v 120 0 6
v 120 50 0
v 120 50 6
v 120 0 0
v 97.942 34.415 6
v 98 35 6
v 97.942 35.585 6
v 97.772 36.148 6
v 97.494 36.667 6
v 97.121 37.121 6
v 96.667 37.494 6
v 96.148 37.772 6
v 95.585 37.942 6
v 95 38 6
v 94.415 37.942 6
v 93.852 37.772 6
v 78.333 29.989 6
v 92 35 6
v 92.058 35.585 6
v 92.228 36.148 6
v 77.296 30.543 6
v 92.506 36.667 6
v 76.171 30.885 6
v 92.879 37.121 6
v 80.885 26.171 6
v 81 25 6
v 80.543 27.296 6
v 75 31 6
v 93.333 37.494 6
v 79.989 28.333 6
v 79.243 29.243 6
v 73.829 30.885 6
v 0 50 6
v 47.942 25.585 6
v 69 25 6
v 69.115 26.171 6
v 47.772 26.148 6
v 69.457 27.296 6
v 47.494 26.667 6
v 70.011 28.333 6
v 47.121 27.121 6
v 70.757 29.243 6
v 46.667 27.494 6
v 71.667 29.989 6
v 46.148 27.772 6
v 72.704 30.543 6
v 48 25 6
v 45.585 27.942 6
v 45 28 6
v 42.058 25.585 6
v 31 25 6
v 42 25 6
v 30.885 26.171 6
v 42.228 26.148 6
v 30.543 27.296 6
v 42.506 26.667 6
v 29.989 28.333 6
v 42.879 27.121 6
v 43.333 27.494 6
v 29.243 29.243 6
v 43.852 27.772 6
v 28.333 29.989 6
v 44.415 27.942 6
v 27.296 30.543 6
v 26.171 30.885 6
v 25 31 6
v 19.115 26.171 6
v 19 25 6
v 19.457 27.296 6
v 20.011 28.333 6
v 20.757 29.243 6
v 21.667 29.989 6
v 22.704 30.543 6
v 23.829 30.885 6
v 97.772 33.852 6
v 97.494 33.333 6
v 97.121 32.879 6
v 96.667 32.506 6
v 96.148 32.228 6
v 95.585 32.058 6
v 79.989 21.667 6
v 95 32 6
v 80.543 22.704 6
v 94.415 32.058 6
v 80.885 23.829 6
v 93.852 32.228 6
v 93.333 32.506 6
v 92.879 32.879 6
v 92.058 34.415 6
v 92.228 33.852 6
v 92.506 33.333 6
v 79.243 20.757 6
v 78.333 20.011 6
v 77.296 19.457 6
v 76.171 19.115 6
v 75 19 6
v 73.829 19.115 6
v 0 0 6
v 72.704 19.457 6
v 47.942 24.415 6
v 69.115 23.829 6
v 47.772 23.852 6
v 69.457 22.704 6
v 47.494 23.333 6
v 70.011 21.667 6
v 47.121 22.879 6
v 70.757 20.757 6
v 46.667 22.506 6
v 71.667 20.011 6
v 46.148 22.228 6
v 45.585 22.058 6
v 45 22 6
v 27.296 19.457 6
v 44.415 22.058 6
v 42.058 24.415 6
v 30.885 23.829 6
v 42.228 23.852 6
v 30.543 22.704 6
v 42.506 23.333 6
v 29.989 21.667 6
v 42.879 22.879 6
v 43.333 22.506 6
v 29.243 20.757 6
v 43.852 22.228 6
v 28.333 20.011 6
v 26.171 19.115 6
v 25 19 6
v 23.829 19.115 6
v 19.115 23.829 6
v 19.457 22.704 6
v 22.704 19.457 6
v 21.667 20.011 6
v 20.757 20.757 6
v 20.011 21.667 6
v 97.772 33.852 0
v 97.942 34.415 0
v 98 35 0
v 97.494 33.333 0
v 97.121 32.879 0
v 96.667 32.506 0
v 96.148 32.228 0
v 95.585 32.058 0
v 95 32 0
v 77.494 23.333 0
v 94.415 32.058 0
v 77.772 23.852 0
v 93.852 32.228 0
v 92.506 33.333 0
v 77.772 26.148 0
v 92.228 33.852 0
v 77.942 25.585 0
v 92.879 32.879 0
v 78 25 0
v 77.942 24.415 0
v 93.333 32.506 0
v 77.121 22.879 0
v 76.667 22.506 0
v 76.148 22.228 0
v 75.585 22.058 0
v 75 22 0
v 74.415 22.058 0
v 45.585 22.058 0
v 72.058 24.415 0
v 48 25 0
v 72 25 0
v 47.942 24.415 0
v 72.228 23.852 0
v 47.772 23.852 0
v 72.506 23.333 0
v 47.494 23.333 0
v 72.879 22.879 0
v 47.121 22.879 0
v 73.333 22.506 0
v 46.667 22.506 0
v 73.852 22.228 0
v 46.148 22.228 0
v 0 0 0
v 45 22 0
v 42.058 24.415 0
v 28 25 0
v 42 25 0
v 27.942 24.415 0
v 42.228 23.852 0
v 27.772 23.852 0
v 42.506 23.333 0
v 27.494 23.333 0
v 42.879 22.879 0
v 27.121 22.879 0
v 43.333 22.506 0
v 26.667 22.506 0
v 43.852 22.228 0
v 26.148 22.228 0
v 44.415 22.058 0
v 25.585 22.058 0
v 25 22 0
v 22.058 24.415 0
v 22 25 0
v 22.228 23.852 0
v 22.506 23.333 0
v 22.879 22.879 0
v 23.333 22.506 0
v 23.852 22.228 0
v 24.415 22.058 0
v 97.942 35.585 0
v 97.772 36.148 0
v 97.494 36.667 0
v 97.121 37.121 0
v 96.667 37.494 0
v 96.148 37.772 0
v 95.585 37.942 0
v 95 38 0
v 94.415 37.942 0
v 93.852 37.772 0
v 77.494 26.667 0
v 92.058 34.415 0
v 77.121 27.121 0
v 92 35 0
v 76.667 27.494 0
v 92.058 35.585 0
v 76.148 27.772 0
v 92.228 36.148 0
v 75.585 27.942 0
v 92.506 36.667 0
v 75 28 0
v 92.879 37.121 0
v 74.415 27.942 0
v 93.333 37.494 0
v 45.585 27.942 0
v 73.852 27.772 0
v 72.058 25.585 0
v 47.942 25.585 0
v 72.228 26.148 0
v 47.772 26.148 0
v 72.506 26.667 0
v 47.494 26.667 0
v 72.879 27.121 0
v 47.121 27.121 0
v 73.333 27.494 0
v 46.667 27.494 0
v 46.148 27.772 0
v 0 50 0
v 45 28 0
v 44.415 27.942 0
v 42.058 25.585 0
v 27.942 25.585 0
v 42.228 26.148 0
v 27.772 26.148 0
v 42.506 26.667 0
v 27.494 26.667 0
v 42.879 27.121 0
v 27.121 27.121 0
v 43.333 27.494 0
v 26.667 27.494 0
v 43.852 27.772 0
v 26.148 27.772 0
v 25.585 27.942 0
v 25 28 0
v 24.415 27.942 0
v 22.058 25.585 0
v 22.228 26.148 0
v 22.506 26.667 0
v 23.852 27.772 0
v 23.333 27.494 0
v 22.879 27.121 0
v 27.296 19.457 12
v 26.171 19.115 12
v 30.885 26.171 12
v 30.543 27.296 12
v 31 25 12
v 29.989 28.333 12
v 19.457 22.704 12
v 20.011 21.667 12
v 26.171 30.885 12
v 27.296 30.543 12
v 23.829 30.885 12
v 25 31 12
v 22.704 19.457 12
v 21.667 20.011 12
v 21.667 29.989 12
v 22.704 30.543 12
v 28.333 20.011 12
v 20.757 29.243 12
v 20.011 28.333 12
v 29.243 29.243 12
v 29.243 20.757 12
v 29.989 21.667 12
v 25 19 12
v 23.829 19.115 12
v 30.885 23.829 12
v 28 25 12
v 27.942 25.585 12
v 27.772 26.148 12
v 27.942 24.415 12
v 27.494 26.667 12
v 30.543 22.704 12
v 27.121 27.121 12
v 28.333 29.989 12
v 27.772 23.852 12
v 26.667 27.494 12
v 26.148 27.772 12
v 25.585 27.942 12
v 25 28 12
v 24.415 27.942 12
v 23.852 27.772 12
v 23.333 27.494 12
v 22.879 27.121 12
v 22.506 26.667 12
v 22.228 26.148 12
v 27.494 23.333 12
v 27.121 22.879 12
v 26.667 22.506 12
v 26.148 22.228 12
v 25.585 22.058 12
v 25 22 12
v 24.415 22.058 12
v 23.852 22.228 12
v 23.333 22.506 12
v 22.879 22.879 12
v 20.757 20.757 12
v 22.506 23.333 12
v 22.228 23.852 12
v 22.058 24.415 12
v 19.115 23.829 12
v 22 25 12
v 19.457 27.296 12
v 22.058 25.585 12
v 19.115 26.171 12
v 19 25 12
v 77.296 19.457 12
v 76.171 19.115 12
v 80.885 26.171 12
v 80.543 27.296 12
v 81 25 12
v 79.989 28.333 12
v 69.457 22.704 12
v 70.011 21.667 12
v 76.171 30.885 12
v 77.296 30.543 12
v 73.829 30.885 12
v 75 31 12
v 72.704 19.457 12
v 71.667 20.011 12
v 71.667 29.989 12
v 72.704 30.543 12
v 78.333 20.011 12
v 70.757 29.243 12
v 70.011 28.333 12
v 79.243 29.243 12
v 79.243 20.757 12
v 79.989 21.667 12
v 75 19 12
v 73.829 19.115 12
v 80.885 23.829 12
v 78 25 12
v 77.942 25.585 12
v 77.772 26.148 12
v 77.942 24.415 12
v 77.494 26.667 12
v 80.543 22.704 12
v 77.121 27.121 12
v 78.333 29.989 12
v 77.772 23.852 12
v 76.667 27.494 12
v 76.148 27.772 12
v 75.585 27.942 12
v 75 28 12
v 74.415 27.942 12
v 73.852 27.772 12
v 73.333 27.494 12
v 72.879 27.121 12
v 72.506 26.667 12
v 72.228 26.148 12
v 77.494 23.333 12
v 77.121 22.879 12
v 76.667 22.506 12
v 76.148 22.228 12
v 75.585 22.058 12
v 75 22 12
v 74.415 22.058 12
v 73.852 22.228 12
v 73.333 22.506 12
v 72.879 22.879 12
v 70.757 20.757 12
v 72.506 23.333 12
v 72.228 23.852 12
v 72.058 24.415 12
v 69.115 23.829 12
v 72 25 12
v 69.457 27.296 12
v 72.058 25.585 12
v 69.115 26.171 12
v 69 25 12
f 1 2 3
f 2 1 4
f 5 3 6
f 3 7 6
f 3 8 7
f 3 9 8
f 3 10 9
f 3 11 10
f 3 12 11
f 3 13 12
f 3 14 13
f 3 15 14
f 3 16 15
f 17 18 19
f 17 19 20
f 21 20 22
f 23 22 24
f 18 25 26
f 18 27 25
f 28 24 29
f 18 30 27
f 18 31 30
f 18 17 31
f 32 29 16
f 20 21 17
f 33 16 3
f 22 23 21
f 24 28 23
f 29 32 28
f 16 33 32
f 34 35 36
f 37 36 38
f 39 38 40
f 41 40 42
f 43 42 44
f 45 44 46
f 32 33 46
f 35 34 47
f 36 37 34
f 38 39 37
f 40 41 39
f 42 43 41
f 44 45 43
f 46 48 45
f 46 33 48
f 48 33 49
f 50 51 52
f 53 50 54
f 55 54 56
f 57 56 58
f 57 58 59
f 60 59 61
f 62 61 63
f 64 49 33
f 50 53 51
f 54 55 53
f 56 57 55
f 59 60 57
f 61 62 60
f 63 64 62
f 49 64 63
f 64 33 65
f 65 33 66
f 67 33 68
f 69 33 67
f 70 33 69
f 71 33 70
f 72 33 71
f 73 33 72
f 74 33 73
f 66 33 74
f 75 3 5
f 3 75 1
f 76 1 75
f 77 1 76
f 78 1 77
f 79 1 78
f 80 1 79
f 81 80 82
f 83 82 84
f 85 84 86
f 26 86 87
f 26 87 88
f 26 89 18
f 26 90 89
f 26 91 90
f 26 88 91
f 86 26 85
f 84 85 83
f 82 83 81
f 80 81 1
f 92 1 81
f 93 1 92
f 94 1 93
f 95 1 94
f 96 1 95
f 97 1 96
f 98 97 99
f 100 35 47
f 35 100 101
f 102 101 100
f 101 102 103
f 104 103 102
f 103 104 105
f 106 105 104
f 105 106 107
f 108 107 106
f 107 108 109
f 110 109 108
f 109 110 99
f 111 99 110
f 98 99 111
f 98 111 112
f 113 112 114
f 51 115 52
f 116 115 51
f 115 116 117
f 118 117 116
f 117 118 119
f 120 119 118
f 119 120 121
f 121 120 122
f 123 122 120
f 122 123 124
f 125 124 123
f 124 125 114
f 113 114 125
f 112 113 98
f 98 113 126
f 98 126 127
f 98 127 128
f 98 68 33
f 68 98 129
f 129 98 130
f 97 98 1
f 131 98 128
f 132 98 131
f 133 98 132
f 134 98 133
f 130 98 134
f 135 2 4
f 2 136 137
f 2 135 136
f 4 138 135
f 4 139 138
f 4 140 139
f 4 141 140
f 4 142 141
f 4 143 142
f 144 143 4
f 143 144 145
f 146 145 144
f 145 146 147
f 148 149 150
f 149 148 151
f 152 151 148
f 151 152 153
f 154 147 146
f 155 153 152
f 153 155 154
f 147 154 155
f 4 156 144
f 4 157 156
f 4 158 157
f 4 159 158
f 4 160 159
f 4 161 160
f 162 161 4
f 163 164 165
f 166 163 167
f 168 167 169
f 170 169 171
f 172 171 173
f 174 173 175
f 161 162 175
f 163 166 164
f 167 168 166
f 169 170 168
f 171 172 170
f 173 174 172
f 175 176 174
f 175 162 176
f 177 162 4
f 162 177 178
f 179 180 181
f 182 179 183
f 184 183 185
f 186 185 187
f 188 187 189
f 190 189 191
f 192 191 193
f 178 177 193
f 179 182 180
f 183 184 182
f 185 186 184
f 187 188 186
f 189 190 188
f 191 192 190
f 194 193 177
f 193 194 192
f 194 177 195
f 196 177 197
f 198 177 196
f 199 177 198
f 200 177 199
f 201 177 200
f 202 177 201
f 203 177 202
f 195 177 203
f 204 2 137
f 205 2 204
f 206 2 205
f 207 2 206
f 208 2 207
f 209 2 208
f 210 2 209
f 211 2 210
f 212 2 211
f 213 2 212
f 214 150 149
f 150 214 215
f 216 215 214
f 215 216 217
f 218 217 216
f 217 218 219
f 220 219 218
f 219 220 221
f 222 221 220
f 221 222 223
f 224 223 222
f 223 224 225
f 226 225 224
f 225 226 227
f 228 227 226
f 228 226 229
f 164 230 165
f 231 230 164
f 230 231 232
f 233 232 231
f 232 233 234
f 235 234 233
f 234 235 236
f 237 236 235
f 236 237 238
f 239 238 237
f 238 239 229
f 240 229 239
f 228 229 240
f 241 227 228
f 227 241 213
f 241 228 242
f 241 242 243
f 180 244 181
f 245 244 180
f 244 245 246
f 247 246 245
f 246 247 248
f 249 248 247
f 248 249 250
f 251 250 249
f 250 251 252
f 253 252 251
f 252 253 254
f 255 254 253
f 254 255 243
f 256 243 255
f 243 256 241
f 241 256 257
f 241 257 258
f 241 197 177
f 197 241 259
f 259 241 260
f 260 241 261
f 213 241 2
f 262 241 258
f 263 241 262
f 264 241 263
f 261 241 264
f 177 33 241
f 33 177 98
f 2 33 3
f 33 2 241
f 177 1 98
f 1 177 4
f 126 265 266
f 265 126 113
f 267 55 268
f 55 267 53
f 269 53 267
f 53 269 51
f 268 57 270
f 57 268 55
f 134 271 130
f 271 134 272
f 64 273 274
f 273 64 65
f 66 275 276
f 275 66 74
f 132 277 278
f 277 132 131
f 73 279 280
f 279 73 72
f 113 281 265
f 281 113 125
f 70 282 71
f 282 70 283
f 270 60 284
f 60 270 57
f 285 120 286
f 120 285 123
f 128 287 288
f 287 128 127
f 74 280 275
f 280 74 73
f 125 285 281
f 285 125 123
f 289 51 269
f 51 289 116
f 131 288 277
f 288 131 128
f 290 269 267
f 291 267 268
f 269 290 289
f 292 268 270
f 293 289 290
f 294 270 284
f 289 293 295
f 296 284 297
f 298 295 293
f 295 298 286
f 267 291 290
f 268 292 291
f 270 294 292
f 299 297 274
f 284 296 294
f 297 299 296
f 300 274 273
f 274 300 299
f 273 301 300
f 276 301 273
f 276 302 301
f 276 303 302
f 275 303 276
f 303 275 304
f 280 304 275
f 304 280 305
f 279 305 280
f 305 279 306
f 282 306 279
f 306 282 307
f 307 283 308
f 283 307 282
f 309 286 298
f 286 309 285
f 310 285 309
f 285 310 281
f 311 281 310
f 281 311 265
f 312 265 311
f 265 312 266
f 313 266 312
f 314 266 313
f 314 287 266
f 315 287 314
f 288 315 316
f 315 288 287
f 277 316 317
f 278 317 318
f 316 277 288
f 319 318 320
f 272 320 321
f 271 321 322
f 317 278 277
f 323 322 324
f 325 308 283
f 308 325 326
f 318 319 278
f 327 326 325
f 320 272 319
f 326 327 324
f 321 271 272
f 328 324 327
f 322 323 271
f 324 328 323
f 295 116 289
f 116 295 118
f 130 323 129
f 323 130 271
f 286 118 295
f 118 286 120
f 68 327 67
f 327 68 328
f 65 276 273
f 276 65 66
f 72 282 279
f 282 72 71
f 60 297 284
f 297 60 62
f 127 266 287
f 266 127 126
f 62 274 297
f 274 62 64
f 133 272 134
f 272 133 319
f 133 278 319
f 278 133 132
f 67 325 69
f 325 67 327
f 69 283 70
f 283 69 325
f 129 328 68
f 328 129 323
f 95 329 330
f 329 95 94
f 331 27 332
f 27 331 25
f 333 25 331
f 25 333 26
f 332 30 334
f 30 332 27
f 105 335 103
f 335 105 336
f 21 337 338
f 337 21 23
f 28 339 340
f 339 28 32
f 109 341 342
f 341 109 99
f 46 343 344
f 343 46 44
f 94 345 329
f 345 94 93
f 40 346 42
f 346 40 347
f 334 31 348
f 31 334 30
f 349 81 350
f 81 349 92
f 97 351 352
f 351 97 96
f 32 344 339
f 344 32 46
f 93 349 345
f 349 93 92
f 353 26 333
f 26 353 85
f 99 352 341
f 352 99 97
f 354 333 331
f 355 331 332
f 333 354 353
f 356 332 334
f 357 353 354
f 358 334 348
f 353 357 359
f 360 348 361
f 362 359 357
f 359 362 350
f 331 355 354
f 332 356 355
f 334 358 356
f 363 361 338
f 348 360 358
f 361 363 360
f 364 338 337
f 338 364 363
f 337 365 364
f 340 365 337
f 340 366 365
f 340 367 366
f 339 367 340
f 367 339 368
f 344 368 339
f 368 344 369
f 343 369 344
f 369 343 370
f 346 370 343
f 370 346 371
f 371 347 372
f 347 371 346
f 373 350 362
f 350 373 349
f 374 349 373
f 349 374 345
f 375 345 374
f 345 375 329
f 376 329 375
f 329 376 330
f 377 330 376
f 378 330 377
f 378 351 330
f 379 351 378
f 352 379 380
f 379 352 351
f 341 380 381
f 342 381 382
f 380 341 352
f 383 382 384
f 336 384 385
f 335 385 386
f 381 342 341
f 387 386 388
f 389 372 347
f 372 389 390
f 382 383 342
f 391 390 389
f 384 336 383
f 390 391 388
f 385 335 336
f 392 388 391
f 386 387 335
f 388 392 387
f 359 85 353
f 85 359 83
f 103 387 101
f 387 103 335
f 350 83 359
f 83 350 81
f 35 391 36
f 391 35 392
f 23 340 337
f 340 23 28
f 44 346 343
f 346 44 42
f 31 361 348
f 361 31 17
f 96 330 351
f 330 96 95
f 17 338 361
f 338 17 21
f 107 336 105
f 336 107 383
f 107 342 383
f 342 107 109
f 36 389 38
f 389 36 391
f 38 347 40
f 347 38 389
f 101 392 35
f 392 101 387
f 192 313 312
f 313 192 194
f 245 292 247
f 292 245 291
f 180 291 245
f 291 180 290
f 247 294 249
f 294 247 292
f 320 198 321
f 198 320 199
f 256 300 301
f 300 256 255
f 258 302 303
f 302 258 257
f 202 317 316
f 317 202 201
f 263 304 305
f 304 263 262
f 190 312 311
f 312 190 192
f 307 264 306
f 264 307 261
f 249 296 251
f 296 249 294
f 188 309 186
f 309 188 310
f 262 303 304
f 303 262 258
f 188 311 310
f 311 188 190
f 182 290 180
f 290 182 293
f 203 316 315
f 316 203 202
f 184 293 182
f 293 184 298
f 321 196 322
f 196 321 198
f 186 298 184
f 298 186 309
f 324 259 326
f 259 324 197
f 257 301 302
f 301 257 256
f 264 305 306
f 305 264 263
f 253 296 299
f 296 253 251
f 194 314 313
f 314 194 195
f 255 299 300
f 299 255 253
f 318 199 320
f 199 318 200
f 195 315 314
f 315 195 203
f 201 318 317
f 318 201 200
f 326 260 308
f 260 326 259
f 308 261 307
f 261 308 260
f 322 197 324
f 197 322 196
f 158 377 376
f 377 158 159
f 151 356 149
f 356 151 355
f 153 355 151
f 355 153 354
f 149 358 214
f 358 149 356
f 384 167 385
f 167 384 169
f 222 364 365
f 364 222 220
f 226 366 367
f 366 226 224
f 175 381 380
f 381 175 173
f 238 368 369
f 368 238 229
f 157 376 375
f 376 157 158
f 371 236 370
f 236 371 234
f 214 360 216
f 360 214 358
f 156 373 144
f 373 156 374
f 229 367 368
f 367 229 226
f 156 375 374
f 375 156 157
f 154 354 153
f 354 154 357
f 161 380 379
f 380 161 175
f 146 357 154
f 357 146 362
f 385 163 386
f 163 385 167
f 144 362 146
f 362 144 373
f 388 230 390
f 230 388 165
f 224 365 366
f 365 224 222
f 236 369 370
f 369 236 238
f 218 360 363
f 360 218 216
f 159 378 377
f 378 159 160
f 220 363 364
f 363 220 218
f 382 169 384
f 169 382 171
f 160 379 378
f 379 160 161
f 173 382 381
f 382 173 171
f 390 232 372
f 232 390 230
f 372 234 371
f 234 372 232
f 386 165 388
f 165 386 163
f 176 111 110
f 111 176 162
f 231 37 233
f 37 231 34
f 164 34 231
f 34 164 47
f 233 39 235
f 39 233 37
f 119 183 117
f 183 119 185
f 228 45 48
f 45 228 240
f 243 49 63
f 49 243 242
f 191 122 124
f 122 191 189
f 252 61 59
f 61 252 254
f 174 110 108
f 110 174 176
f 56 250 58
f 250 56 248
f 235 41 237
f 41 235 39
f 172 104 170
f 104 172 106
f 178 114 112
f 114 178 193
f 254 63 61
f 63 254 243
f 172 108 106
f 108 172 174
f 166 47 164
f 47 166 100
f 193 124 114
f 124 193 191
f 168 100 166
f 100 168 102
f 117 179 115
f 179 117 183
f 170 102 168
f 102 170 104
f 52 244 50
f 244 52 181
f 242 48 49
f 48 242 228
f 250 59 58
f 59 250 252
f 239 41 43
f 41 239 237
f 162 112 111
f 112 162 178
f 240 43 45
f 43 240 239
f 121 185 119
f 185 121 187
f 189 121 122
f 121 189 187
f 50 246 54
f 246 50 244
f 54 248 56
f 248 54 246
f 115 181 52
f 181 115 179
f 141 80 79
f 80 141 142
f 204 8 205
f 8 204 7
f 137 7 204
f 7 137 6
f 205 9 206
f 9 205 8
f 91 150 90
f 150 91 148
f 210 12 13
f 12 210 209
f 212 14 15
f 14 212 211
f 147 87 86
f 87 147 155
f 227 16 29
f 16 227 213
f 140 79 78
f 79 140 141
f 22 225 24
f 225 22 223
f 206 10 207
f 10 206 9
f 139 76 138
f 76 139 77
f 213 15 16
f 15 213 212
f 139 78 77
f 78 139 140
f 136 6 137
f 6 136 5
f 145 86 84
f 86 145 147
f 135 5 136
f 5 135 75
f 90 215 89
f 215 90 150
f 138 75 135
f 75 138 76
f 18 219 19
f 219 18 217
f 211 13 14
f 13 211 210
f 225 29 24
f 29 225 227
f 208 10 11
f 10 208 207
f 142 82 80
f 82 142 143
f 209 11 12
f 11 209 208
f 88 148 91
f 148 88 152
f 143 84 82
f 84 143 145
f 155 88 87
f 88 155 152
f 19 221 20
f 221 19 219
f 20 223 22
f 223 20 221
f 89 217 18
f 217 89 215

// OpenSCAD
$fn = 32;

// ----------------------------------------------------------------------
// Mixed field: bosses and holes at given coordinates
// ----------------------------------------------------------------------

// --- parameters (mm) ---
plate_l = 120;            // plate length, X
plate_w = 50;             // plate width, Y
plate_t = 6;              // plate thickness, Z
boss_d = 12;              // boss diameter
boss_h = 6;               // boss height above the plate
hole_d = 6;               // through hole diameter
fit_tol = 0.02;           // tolerance for press fits, mm
free_tol = 0.2;           // tolerance for clearance fits, mm

total_h = plate_t + boss_h;  // overall height

difference() {
  union() {
    cube([plate_l, plate_w, plate_t]);
    translate([25, 25, plate_t]) cylinder(h = boss_h, d = boss_d);
    translate([75, 25, plate_t]) cylinder(h = boss_h, d = boss_d);
  }
  translate([25, 25, -1]) cylinder(h = total_h + 2, d = boss_d / 2);
  translate([75, 25, -1]) cylinder(h = total_h + 2, d = boss_d / 2);
  translate([45, 25, -1]) cylinder(h = plate_t + 2, d = hole_d);
  translate([95, 35, -1]) cylinder(h = plate_t + 2, d = hole_d);
}
